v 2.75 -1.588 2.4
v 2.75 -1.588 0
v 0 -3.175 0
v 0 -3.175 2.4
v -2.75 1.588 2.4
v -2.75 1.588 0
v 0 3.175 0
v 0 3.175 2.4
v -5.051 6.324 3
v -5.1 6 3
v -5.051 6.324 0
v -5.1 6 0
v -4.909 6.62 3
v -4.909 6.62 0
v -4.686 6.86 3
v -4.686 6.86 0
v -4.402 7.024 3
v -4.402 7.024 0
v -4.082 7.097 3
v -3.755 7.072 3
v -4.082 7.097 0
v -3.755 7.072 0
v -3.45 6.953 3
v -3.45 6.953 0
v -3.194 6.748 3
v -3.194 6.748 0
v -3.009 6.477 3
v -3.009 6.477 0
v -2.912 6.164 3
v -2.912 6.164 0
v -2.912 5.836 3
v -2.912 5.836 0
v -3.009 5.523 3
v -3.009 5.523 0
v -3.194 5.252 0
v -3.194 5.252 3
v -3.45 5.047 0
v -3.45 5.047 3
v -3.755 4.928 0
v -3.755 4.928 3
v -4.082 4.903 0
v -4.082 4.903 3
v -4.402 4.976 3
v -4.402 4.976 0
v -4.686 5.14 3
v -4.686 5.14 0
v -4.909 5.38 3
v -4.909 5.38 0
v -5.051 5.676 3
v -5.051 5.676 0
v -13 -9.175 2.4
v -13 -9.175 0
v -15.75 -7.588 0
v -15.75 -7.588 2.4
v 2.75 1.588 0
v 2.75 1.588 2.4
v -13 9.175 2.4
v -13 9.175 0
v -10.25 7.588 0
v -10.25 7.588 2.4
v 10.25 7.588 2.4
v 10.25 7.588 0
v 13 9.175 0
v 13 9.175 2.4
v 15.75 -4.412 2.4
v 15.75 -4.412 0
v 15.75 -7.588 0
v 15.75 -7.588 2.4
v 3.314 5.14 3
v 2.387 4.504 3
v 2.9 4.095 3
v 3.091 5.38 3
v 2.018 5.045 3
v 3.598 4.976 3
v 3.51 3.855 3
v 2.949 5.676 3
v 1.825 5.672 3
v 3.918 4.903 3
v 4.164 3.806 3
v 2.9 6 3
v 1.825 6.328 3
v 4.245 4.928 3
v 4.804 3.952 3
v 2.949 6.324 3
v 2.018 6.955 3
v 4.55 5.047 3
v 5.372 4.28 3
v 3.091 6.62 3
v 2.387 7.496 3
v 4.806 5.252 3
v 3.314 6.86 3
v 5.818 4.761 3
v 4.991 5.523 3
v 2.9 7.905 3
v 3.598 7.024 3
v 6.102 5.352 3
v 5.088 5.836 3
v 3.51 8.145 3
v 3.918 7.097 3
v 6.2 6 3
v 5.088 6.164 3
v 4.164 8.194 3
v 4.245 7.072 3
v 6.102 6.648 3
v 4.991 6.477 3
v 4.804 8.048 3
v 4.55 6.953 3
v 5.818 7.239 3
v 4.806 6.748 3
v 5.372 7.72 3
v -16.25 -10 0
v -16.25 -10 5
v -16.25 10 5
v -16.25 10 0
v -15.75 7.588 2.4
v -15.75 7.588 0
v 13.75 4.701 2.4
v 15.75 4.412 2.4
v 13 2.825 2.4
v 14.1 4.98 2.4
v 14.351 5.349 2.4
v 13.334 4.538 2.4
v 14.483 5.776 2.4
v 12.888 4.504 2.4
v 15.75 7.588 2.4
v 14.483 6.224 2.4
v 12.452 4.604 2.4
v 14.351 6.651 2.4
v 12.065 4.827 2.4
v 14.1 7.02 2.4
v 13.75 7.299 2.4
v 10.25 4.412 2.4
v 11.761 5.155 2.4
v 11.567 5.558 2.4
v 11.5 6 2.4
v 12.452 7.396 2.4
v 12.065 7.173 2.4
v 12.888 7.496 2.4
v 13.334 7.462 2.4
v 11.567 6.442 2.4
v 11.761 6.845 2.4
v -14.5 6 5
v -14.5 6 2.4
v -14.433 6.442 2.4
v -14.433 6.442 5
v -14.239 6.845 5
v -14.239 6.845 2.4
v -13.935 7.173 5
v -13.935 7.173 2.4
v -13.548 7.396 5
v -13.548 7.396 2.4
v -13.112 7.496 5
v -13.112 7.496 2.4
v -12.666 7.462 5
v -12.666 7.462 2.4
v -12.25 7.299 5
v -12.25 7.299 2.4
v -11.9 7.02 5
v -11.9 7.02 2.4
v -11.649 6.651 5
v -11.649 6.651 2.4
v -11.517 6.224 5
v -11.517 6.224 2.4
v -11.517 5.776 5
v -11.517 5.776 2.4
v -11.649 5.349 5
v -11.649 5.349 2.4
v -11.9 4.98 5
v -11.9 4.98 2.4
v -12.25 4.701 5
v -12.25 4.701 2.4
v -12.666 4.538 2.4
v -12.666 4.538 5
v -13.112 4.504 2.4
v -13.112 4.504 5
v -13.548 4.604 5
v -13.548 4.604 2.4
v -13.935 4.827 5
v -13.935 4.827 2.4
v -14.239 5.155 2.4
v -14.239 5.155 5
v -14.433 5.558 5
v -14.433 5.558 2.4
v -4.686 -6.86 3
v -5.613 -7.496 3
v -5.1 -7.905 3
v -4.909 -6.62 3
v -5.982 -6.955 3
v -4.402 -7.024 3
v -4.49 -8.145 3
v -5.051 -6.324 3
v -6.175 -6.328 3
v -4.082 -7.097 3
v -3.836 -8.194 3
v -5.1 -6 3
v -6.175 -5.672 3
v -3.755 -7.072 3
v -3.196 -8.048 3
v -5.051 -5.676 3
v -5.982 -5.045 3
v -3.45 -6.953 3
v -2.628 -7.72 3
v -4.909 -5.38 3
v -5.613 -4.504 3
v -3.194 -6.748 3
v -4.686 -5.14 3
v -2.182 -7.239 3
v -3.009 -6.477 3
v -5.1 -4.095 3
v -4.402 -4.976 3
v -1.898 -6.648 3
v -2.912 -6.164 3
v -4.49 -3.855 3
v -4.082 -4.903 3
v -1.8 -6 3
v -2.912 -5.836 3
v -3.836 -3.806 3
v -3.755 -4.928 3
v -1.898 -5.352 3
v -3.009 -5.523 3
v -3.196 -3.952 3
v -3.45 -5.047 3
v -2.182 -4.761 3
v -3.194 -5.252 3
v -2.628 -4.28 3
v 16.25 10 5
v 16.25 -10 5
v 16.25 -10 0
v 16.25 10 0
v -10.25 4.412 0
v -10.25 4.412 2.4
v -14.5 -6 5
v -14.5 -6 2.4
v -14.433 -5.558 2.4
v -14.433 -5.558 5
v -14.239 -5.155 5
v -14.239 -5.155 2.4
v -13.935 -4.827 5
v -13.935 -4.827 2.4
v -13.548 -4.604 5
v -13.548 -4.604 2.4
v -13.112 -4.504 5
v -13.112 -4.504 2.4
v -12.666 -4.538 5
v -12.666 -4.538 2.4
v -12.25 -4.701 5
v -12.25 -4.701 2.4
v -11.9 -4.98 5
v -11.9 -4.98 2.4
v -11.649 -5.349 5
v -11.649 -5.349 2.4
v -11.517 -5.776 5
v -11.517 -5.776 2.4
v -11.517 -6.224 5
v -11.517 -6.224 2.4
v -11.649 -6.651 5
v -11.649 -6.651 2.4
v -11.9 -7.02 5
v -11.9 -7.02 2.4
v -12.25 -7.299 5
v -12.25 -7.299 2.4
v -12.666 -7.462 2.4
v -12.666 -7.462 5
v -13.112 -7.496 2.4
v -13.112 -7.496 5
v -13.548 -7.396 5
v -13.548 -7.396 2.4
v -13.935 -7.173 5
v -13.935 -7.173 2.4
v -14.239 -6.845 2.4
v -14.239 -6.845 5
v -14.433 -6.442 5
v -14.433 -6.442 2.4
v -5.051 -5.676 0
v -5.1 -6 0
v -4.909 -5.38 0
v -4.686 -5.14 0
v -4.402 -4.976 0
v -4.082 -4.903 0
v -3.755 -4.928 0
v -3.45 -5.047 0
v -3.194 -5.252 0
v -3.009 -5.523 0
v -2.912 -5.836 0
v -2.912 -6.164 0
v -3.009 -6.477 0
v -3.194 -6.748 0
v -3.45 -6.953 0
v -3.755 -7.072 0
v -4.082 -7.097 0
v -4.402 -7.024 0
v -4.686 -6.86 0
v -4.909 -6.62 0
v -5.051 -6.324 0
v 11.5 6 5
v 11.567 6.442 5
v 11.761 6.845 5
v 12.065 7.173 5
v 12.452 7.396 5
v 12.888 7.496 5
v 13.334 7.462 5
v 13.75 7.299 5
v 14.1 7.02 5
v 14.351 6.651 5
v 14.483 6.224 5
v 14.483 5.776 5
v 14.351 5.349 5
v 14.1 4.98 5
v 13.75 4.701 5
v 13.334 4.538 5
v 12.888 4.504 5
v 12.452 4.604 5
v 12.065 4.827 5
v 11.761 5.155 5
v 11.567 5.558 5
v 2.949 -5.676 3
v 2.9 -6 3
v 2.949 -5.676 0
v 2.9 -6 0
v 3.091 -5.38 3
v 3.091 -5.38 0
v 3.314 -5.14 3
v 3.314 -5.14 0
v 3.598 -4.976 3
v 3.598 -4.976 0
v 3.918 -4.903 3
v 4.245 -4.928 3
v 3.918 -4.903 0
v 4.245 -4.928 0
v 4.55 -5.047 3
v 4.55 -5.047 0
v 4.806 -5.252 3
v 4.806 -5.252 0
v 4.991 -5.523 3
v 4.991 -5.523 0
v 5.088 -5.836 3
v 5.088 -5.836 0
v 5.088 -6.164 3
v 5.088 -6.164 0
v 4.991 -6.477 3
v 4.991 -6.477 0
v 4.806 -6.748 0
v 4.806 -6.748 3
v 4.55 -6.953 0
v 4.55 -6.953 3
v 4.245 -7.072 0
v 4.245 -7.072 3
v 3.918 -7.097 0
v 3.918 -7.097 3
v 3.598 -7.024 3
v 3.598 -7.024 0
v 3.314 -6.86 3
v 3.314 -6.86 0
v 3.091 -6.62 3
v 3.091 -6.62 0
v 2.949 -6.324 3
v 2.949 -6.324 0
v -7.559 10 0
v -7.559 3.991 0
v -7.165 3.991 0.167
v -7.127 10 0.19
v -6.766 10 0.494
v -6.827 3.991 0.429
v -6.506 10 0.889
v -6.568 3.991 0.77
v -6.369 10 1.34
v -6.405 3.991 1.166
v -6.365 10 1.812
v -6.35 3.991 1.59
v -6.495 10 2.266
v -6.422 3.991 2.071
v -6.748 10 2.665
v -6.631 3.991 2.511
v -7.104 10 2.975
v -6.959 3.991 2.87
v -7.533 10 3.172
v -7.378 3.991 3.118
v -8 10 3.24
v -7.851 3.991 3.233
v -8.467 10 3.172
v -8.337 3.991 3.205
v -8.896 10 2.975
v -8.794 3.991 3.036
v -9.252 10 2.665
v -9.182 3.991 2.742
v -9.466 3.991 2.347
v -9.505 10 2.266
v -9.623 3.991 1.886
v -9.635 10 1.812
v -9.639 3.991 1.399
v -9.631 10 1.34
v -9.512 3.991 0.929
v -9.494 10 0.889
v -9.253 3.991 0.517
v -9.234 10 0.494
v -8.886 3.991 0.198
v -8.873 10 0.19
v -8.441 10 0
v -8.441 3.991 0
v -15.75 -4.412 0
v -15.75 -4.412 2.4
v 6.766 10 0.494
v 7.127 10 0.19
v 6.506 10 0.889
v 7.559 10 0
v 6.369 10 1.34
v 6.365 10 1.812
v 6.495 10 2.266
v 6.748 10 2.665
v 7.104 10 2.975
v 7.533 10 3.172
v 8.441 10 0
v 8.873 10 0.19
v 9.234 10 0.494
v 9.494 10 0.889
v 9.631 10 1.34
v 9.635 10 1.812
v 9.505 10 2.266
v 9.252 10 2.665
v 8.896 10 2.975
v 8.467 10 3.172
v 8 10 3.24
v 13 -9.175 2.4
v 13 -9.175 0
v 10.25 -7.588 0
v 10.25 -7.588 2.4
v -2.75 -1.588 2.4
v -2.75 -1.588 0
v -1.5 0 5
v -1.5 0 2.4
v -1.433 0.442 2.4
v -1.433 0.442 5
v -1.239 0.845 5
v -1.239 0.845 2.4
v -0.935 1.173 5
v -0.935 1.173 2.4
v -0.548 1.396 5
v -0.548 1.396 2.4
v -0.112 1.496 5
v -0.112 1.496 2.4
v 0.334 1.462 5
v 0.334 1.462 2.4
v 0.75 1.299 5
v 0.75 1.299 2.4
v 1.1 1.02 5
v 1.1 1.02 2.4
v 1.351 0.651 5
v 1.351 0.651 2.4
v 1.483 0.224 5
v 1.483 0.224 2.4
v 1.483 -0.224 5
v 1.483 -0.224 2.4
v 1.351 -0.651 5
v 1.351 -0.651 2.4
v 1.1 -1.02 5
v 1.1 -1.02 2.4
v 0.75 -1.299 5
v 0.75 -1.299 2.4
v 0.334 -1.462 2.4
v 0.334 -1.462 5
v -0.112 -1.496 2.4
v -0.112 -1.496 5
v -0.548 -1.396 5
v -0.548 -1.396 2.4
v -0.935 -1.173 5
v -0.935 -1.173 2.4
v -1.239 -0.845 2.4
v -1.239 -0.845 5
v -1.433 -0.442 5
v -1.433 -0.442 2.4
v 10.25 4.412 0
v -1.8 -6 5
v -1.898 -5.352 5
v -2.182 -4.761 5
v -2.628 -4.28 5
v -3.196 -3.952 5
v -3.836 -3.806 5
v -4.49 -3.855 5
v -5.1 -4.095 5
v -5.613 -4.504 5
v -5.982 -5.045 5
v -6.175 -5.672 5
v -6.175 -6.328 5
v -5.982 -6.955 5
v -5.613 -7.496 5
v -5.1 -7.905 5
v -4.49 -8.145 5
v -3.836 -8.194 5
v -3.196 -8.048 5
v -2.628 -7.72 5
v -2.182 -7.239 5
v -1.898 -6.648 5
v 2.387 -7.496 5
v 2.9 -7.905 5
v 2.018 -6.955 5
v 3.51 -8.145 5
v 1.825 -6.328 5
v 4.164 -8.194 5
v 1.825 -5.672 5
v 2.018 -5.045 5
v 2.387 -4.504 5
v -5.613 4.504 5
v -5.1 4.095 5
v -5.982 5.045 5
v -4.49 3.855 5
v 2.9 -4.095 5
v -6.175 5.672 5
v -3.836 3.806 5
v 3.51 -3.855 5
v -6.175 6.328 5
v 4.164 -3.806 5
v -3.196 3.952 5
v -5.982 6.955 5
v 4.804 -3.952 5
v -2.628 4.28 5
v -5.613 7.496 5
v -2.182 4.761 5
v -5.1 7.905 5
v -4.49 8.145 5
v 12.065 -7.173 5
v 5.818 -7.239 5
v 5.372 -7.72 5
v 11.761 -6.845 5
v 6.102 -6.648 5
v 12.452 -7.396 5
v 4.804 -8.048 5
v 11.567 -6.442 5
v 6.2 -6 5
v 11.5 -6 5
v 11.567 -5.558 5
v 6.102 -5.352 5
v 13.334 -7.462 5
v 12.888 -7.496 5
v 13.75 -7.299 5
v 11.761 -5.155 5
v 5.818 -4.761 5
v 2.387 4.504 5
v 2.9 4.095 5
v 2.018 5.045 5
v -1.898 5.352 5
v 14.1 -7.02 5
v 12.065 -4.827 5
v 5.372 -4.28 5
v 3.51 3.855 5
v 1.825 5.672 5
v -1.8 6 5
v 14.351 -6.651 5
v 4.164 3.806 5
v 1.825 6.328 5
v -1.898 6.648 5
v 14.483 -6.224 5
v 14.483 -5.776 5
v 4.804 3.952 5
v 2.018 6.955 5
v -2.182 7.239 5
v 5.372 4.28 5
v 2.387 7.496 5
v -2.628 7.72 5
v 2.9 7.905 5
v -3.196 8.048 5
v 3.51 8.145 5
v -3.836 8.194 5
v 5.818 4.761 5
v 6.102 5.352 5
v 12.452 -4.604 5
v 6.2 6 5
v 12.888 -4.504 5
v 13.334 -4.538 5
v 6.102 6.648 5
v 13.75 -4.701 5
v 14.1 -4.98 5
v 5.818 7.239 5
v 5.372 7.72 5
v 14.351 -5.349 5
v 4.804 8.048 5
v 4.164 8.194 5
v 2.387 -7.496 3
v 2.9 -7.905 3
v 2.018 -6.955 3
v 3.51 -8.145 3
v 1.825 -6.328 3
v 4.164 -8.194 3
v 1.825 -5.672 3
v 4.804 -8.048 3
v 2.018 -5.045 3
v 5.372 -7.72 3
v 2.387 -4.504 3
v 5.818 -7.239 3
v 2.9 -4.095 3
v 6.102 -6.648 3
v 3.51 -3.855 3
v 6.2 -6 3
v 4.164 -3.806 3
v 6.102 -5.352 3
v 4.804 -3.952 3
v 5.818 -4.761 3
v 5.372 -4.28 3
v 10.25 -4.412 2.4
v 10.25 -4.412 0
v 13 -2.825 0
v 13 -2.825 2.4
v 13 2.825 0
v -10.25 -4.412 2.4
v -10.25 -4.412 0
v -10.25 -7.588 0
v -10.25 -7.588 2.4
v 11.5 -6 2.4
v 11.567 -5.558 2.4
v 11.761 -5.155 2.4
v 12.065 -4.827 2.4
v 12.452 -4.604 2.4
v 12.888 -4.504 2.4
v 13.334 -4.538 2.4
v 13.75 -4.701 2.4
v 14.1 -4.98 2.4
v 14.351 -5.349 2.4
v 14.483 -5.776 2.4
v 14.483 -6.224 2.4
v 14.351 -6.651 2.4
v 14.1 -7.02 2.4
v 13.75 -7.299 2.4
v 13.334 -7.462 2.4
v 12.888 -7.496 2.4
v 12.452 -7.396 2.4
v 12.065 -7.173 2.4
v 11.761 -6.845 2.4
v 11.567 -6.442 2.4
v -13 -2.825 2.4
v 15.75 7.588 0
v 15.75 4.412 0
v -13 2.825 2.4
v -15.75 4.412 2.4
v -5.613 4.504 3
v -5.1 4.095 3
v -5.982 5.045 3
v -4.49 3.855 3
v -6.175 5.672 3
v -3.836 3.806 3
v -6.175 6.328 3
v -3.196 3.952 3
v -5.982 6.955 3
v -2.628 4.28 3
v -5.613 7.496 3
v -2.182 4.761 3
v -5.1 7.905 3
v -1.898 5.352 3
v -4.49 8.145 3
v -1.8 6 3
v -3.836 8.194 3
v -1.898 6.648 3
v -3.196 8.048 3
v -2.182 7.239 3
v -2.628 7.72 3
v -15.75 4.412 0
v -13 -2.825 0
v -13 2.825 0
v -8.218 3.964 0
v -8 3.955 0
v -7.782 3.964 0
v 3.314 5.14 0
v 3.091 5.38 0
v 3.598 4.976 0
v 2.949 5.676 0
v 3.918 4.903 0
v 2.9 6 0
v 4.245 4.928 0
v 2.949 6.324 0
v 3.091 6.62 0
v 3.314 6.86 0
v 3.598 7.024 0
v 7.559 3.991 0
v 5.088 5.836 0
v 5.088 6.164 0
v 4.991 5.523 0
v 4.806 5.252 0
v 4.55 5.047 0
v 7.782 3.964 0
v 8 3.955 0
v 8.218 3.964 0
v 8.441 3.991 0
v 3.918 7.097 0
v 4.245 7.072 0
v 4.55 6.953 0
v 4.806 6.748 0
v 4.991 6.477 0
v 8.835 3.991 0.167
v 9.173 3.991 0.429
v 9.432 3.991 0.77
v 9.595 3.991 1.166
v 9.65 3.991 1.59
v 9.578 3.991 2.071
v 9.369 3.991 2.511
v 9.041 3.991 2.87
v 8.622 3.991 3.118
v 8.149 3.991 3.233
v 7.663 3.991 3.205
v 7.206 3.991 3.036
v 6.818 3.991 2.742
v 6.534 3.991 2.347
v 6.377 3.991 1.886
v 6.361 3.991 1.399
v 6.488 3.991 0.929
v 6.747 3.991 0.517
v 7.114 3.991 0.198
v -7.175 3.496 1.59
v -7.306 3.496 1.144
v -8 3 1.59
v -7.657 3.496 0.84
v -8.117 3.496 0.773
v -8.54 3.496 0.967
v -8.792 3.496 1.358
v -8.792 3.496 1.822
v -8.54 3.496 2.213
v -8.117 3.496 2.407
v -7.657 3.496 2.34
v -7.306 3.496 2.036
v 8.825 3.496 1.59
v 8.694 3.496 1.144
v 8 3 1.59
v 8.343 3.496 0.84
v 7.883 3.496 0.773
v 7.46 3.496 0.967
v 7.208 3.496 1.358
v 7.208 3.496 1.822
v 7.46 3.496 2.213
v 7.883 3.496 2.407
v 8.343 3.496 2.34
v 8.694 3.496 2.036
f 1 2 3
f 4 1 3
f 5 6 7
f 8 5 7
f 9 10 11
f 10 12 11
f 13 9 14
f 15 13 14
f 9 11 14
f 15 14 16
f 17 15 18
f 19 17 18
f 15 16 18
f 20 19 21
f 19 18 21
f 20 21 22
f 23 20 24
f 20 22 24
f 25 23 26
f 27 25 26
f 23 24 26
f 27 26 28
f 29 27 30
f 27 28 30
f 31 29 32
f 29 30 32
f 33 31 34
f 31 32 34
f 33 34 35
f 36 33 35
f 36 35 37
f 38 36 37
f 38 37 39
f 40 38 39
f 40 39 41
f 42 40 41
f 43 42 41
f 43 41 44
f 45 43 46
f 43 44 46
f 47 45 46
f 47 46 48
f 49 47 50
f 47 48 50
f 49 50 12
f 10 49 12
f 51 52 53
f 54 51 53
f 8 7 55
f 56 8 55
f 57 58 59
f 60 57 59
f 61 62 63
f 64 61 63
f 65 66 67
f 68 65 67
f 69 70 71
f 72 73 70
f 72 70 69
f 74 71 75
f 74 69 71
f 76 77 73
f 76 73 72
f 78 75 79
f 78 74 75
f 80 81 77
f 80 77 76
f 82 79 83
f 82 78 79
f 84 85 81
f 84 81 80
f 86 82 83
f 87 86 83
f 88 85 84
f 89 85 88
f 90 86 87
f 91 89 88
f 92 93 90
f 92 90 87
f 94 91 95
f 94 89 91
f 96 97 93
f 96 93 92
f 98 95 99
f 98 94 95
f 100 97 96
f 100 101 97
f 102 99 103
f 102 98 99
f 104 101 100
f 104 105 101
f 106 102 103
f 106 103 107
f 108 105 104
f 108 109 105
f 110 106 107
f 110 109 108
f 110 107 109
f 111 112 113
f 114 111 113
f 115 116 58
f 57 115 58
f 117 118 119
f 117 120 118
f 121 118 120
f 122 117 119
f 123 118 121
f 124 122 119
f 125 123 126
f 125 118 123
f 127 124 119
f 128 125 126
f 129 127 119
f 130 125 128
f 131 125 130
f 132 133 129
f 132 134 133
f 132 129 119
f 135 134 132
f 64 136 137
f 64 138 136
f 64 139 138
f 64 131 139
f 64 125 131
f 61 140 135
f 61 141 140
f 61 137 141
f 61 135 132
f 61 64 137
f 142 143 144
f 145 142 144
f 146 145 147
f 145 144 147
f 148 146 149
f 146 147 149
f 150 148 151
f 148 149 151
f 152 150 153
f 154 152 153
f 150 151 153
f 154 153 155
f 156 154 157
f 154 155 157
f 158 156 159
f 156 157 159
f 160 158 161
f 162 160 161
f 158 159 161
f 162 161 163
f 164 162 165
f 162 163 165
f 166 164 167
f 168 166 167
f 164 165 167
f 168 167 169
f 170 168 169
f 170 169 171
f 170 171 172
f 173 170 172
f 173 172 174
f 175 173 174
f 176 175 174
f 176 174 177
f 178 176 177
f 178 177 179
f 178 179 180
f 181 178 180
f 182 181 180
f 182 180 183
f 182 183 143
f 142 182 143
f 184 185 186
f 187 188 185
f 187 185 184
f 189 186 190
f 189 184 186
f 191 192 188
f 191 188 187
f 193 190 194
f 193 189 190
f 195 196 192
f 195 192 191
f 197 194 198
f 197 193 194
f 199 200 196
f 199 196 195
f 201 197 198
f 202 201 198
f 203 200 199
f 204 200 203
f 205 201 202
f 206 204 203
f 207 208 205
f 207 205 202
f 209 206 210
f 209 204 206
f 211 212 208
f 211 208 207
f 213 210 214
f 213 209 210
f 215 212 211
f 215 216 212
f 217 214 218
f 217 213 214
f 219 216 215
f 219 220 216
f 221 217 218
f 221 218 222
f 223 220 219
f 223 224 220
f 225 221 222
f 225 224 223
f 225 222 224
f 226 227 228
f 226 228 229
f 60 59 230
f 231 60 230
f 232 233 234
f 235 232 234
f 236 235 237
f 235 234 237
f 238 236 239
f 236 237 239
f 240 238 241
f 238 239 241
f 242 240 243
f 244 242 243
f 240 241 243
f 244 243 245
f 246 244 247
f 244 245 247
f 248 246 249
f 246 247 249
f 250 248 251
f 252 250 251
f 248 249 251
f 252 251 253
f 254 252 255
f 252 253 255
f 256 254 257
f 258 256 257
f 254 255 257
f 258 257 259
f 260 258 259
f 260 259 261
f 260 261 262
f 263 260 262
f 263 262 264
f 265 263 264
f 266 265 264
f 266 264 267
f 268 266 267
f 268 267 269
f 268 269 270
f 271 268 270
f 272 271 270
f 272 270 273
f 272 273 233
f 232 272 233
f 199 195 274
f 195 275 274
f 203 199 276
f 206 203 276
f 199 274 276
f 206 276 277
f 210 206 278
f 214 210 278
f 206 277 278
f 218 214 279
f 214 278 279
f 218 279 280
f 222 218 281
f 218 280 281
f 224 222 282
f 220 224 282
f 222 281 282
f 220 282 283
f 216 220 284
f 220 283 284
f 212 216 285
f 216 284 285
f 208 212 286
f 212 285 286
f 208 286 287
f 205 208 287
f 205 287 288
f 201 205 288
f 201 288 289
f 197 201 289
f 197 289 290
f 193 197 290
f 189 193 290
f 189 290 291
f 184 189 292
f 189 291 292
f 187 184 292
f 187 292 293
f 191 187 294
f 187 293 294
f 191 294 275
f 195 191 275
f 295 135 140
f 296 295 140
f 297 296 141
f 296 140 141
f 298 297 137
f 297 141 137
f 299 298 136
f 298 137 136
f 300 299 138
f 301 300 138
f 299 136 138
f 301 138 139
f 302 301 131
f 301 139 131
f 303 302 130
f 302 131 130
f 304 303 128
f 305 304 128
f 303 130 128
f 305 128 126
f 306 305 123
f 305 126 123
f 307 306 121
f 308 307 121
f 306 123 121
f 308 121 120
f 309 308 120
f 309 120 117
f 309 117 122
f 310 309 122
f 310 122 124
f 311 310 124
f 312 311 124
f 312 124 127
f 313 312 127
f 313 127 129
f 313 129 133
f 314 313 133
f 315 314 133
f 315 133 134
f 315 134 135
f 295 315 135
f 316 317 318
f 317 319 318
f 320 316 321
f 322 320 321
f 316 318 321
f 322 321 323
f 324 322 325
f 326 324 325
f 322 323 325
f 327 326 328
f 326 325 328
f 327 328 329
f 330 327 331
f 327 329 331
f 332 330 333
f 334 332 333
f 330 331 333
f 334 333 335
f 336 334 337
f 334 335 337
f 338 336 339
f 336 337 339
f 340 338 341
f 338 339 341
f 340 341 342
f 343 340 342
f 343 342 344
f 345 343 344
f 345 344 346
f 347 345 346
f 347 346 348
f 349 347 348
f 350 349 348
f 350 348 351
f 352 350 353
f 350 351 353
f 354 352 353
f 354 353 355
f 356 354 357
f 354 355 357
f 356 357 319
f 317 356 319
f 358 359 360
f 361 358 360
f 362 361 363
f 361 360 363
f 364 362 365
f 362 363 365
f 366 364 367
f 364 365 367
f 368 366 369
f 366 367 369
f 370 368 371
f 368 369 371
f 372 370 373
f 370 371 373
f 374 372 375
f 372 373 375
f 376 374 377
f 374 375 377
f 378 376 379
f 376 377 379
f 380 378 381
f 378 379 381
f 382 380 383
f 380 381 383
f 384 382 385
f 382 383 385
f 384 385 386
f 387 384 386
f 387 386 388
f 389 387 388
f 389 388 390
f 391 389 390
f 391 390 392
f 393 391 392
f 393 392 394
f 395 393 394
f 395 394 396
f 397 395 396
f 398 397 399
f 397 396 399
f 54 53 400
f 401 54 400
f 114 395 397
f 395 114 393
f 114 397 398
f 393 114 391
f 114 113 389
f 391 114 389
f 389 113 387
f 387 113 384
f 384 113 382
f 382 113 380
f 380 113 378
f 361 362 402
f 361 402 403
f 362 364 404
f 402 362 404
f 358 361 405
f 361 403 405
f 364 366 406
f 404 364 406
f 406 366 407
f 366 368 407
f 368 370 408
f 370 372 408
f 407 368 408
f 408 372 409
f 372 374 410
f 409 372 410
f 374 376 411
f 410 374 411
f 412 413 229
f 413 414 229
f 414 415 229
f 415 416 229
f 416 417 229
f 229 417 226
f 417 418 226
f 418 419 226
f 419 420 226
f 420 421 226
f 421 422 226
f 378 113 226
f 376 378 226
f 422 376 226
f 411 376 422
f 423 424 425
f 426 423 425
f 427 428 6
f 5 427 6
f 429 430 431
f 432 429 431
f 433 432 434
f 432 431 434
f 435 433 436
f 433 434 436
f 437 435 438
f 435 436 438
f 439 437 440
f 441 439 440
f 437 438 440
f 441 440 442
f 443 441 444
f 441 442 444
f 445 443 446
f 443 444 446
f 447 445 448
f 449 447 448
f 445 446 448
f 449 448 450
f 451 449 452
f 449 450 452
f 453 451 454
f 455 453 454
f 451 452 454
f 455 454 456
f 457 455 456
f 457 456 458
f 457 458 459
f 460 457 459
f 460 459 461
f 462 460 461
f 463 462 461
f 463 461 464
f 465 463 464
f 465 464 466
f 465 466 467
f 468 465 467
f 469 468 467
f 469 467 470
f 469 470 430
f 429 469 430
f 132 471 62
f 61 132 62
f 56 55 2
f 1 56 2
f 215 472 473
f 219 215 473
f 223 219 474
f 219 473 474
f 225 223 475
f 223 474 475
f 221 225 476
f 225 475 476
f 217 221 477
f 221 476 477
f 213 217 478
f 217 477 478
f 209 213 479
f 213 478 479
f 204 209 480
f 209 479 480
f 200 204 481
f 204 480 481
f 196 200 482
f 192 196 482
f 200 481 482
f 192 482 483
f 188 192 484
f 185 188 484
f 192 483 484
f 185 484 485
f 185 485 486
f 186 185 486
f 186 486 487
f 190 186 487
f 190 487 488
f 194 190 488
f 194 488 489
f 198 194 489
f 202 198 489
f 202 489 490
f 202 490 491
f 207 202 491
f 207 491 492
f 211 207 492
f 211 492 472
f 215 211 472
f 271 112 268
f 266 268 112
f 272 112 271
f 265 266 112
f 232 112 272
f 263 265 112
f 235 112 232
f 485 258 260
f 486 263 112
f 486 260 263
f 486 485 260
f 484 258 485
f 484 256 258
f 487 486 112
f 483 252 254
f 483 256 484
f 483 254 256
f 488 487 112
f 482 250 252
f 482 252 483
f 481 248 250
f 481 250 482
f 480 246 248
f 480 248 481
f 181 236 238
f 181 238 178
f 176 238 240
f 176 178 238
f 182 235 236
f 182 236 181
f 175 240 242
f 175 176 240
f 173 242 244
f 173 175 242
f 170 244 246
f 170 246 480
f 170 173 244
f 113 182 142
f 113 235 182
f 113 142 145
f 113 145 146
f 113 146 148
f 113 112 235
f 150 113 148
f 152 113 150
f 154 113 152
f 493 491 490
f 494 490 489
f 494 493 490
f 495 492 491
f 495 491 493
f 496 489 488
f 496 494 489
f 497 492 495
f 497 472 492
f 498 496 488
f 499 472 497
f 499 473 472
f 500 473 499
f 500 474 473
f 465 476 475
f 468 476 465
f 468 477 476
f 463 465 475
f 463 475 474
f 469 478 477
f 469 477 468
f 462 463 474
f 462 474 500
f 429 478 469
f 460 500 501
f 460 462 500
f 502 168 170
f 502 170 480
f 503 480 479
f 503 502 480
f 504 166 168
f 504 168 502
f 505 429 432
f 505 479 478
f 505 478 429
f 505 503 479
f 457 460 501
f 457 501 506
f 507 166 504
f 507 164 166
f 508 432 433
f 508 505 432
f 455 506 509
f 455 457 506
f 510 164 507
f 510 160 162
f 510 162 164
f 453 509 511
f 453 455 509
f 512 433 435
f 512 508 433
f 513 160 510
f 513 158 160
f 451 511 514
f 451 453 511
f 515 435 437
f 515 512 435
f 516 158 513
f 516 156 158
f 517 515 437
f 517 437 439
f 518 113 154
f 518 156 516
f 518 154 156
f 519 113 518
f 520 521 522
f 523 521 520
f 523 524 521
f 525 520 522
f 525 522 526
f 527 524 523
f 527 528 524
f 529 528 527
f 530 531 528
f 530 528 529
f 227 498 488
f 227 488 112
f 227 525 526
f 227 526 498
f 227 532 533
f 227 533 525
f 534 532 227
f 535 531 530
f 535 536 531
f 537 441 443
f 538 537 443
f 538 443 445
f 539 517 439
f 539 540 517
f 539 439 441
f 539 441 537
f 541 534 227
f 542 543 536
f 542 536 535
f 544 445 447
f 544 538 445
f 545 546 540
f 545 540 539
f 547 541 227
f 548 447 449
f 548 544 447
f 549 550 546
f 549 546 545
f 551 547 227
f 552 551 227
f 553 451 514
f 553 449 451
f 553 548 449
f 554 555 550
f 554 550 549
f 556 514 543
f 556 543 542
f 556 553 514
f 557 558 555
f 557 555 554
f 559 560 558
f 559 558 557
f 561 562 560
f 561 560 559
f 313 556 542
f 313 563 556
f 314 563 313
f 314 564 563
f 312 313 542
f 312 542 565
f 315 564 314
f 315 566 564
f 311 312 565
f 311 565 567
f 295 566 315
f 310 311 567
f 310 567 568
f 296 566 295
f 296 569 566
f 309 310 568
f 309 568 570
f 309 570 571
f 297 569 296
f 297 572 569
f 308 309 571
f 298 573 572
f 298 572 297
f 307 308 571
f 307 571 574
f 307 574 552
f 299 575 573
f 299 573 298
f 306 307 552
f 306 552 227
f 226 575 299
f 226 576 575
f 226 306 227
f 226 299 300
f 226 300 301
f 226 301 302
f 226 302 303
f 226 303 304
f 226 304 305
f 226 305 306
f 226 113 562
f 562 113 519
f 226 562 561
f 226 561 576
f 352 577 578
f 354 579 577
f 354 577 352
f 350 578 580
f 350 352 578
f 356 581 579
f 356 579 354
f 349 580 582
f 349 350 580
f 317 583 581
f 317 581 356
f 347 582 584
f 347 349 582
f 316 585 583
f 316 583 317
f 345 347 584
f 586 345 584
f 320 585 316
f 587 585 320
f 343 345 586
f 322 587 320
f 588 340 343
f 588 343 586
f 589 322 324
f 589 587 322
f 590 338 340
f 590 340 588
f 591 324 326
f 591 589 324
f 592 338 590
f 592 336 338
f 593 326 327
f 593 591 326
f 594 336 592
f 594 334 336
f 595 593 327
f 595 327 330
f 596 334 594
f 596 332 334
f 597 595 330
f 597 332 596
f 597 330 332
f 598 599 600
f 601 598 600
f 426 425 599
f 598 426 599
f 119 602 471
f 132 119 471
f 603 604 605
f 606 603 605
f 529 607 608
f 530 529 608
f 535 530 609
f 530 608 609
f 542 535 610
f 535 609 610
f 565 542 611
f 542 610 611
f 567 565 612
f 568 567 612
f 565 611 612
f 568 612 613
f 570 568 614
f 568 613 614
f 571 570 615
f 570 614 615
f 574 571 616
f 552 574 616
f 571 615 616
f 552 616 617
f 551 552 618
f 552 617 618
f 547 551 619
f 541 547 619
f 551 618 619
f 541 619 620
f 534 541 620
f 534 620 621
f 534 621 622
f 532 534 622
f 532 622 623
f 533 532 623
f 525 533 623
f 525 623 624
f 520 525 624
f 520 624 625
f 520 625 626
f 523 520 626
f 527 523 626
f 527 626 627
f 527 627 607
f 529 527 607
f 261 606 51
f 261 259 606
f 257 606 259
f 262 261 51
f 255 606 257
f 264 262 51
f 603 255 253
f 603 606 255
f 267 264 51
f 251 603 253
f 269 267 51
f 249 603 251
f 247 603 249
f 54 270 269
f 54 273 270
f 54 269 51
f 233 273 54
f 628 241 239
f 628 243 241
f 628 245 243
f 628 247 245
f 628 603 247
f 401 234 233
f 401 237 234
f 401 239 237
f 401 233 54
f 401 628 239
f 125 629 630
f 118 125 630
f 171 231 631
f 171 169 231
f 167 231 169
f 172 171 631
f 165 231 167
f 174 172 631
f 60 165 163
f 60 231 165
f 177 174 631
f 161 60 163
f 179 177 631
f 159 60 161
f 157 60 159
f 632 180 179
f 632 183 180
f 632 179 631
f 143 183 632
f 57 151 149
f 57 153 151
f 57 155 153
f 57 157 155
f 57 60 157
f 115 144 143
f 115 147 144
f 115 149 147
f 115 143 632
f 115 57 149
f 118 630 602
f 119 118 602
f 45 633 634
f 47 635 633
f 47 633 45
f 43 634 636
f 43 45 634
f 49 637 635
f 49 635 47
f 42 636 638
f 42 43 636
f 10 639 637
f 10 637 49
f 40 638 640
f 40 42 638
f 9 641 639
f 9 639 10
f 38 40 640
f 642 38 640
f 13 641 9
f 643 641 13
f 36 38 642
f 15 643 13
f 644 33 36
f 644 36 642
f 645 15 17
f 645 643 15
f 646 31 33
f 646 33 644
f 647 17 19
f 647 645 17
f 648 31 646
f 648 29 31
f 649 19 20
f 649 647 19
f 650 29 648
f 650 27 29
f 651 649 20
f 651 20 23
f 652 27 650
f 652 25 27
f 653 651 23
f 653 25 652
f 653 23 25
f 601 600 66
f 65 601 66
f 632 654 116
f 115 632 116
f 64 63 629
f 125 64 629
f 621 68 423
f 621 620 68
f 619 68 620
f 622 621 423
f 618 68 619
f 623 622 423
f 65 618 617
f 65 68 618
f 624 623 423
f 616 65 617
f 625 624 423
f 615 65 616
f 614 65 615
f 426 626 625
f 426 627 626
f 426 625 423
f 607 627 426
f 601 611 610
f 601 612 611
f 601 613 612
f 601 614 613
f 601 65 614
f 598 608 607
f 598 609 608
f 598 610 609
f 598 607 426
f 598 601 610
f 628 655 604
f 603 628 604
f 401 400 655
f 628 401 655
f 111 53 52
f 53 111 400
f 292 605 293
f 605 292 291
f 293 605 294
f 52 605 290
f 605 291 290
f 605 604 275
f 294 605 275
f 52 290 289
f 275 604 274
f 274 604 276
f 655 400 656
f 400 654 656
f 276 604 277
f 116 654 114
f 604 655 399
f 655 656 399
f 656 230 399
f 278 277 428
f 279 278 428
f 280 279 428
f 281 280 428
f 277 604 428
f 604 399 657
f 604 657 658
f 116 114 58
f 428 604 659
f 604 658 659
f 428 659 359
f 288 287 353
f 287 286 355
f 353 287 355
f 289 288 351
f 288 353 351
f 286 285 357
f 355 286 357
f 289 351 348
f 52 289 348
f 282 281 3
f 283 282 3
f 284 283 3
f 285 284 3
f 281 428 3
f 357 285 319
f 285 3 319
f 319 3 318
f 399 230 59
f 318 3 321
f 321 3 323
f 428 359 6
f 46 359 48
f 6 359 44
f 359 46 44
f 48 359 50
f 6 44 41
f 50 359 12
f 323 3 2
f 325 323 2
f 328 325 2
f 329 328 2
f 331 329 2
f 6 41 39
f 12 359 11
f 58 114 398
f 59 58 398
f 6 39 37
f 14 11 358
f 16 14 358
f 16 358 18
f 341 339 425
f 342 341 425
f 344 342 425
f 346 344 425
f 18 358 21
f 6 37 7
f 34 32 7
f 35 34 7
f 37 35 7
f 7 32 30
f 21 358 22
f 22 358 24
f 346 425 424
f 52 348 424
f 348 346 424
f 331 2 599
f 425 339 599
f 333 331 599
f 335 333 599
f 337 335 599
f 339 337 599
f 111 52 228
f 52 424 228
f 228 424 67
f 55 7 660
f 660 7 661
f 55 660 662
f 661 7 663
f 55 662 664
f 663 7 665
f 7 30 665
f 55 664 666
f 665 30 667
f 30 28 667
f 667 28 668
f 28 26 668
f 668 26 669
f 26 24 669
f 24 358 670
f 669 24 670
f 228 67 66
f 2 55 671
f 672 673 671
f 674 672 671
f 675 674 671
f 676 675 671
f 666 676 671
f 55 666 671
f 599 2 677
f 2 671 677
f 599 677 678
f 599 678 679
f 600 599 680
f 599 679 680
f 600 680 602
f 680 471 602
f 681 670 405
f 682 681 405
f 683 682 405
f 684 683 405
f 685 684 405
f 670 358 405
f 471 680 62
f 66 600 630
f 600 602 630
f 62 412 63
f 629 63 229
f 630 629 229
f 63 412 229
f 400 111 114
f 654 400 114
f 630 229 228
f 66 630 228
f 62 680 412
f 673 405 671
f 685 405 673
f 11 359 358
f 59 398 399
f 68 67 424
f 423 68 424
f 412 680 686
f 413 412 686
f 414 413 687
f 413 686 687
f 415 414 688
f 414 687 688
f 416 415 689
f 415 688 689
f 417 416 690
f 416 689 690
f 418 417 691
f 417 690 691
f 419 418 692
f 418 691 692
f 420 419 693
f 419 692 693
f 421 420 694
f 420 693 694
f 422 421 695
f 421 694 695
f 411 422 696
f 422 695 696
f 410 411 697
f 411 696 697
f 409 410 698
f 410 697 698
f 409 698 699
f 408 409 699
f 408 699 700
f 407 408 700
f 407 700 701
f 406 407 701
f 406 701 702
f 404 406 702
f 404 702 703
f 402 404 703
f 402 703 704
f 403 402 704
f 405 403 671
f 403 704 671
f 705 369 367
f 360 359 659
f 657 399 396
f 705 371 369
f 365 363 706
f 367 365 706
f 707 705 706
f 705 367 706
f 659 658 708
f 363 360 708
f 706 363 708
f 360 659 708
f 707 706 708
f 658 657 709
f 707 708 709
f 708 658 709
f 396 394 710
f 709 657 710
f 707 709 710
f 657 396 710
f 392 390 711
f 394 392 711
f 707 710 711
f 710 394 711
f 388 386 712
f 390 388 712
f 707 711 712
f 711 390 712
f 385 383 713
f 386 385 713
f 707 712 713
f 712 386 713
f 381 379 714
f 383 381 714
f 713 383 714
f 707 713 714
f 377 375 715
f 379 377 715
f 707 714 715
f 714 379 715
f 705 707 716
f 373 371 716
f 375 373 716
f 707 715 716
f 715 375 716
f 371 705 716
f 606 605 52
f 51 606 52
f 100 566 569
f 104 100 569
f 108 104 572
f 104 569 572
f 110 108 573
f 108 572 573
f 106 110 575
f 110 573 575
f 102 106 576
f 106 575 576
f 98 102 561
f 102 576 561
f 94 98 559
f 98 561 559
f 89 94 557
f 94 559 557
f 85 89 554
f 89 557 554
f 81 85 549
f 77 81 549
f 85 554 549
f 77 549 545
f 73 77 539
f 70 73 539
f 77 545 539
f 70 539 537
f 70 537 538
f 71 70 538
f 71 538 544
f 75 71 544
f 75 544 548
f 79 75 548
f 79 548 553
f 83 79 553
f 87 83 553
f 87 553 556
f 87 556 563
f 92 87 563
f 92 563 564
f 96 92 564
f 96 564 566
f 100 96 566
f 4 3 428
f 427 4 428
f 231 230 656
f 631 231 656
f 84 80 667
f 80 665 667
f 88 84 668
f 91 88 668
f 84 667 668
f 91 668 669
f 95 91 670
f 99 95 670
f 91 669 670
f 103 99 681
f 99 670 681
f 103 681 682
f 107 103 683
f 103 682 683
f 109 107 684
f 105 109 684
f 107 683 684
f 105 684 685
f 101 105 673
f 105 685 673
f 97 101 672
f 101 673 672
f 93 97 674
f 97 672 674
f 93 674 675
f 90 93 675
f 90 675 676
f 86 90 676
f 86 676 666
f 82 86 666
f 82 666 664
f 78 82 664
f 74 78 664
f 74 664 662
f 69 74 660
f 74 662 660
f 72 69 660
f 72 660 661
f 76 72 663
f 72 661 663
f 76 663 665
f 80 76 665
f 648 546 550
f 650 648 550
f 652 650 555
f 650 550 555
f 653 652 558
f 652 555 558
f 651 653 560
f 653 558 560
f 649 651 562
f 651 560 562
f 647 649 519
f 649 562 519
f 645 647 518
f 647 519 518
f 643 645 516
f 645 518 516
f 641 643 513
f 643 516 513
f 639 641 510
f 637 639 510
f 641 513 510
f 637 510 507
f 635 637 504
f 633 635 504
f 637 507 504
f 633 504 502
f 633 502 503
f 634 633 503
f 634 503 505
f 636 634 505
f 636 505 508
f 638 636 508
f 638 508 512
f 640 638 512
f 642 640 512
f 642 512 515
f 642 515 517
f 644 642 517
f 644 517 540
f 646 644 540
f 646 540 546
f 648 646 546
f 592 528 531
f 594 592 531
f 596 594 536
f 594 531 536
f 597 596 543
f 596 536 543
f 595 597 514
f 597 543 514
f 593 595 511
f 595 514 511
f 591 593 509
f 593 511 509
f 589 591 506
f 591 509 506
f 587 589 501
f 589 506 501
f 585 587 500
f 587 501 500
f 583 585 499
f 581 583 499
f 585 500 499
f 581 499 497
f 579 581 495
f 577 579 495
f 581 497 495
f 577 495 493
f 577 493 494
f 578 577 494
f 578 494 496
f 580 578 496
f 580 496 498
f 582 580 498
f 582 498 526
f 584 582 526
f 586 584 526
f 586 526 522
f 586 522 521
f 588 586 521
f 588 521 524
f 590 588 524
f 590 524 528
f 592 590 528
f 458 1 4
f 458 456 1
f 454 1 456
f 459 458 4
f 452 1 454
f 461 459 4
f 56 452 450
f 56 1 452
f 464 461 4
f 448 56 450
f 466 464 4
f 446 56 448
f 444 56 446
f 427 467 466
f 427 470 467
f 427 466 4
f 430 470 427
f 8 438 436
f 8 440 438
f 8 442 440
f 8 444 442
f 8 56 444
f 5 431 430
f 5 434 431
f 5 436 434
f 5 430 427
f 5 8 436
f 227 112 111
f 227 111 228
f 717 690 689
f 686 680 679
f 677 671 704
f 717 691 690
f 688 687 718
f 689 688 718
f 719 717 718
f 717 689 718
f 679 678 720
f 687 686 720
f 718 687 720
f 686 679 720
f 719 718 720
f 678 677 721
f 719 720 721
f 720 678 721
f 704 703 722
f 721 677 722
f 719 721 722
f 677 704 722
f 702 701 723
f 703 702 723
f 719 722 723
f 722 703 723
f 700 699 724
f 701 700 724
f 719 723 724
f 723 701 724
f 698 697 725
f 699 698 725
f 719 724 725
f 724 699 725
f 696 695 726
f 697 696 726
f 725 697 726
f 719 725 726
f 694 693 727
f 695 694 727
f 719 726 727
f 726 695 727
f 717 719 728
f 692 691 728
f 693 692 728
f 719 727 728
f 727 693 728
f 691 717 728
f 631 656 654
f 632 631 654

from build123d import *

# Parameters (mm, degrees)
SKETCH1_W                       = 22.5
SKETCH1_H                       = 20
BOSS_EXTRUDE1_DEPTH             = 5
CBORE_FOR_M2_SHCS1_D            = 2.2
CBORE_FOR_M2_SHCS1_CBORE_D      = 4.4
CBORE_FOR_M2_SHCS1_CBORE_DEPTH  = 2
TAP_DRILL_FOR_M2X0_4_TAP1_D     = 3.3
TAP_DRILL_FOR_M2X0_4_TAP1_DEPTH = 6.008579979
TAP_DRILL_FOR_M2X0_4_TAP1_TIP   = 0.991420021
SKETCH9_W                       = 5
SKETCH9_H                       = 20
BOSS_EXTRUDE2_DEPTH             = 5
F_3_0MM_DOWEL_HOLE1_D           = 3
CUT_EXTRUDE1_DEPTH              = 2.4


with BuildPart() as part:
    # Sketch1 → Boss-Extrude1 (new body)
    with BuildSketch(Plane.XY):
        Rectangle(SKETCH1_W, SKETCH1_H)
    extrude(amount=BOSS_EXTRUDE1_DEPTH)

    # CBORE for M2 SHCS1 (through all)
    with Locations(Plane.XY.offset(5)):
        with Locations((4, 6), (-4, -6), (-4, 6), (4, -6)):
            CounterBoreHole(CBORE_FOR_M2_SHCS1_D / 2, CBORE_FOR_M2_SHCS1_CBORE_D / 2, CBORE_FOR_M2_SHCS1_CBORE_DEPTH)

    # Tap Drill for M2x0.4 Tap1
    with Locations(Plane(origin=(0, 10, 0), x_dir=(1, 0, 0), z_dir=(0, 1, 0))):
        with Locations((8, -1.59), (-8, -1.59)):
            Hole(TAP_DRILL_FOR_M2X0_4_TAP1_D / 2, depth=TAP_DRILL_FOR_M2X0_4_TAP1_DEPTH)
            with Locations((0, 0, -(TAP_DRILL_FOR_M2X0_4_TAP1_DEPTH + TAP_DRILL_FOR_M2X0_4_TAP1_TIP / 2))):  # 118° drill point
                Cone(0, TAP_DRILL_FOR_M2X0_4_TAP1_D / 2, TAP_DRILL_FOR_M2X0_4_TAP1_TIP, mode=Mode.SUBTRACT)

    # Sketch9 → Boss-Extrude2 (add)
    with BuildSketch(Plane.XY.offset(5)):
        with Locations((-13.75, 0)):
            Rectangle(SKETCH9_W, SKETCH9_H)
        with Locations((13.75, 0)):
            Rectangle(SKETCH9_W, SKETCH9_H)
    extrude(amount=-BOSS_EXTRUDE2_DEPTH)

    # Ø3.0mm Dowel Hole1 (through all)
    with Locations(Plane.XY.offset(5)):
        with Locations((0, 0), (-13, 6), (-13, -6), (13, -6), (13, 6)):
            Hole(F_3_0MM_DOWEL_HOLE1_D / 2)

    # Sketch12 → Cut-Extrude1 (cut)
    with BuildSketch(Plane(origin=(0, 0, 0), x_dir=(-1, 0, 0), z_dir=(0, 0, -1))):
        Polygon((-13, 2.824573519), (-10.25, 4.41228676), (-10.25, 7.58771324), (-13, 9.175426481), (-15.75, 7.58771324), (-15.75, 4.41228676), align=None)
        Polygon((0, -3.175426481), (2.75, -1.58771324), (2.75, 1.58771324), (0, 3.175426481), (-2.75, 1.58771324), (-2.75, -1.58771324), align=None)
        Polygon((13, 2.824573519), (15.75, 4.41228676), (15.75, 7.58771324), (13, 9.175426481), (10.25, 7.58771324), (10.25, 4.41228676), align=None)
        Polygon((13, -2.824573519), (10.25, -4.41228676), (10.25, -7.58771324), (13, -9.175426481), (15.75, -7.58771324), (15.75, -4.41228676), align=None)
        Polygon((-13, -2.824573519), (-15.75, -4.41228676), (-15.75, -7.58771324), (-13, -9.175426481), (-10.25, -7.58771324), (-10.25, -4.41228676), align=None)
    extrude(amount=-CUT_EXTRUDE1_DEPTH, mode=Mode.SUBTRACT)


solid = part.part
